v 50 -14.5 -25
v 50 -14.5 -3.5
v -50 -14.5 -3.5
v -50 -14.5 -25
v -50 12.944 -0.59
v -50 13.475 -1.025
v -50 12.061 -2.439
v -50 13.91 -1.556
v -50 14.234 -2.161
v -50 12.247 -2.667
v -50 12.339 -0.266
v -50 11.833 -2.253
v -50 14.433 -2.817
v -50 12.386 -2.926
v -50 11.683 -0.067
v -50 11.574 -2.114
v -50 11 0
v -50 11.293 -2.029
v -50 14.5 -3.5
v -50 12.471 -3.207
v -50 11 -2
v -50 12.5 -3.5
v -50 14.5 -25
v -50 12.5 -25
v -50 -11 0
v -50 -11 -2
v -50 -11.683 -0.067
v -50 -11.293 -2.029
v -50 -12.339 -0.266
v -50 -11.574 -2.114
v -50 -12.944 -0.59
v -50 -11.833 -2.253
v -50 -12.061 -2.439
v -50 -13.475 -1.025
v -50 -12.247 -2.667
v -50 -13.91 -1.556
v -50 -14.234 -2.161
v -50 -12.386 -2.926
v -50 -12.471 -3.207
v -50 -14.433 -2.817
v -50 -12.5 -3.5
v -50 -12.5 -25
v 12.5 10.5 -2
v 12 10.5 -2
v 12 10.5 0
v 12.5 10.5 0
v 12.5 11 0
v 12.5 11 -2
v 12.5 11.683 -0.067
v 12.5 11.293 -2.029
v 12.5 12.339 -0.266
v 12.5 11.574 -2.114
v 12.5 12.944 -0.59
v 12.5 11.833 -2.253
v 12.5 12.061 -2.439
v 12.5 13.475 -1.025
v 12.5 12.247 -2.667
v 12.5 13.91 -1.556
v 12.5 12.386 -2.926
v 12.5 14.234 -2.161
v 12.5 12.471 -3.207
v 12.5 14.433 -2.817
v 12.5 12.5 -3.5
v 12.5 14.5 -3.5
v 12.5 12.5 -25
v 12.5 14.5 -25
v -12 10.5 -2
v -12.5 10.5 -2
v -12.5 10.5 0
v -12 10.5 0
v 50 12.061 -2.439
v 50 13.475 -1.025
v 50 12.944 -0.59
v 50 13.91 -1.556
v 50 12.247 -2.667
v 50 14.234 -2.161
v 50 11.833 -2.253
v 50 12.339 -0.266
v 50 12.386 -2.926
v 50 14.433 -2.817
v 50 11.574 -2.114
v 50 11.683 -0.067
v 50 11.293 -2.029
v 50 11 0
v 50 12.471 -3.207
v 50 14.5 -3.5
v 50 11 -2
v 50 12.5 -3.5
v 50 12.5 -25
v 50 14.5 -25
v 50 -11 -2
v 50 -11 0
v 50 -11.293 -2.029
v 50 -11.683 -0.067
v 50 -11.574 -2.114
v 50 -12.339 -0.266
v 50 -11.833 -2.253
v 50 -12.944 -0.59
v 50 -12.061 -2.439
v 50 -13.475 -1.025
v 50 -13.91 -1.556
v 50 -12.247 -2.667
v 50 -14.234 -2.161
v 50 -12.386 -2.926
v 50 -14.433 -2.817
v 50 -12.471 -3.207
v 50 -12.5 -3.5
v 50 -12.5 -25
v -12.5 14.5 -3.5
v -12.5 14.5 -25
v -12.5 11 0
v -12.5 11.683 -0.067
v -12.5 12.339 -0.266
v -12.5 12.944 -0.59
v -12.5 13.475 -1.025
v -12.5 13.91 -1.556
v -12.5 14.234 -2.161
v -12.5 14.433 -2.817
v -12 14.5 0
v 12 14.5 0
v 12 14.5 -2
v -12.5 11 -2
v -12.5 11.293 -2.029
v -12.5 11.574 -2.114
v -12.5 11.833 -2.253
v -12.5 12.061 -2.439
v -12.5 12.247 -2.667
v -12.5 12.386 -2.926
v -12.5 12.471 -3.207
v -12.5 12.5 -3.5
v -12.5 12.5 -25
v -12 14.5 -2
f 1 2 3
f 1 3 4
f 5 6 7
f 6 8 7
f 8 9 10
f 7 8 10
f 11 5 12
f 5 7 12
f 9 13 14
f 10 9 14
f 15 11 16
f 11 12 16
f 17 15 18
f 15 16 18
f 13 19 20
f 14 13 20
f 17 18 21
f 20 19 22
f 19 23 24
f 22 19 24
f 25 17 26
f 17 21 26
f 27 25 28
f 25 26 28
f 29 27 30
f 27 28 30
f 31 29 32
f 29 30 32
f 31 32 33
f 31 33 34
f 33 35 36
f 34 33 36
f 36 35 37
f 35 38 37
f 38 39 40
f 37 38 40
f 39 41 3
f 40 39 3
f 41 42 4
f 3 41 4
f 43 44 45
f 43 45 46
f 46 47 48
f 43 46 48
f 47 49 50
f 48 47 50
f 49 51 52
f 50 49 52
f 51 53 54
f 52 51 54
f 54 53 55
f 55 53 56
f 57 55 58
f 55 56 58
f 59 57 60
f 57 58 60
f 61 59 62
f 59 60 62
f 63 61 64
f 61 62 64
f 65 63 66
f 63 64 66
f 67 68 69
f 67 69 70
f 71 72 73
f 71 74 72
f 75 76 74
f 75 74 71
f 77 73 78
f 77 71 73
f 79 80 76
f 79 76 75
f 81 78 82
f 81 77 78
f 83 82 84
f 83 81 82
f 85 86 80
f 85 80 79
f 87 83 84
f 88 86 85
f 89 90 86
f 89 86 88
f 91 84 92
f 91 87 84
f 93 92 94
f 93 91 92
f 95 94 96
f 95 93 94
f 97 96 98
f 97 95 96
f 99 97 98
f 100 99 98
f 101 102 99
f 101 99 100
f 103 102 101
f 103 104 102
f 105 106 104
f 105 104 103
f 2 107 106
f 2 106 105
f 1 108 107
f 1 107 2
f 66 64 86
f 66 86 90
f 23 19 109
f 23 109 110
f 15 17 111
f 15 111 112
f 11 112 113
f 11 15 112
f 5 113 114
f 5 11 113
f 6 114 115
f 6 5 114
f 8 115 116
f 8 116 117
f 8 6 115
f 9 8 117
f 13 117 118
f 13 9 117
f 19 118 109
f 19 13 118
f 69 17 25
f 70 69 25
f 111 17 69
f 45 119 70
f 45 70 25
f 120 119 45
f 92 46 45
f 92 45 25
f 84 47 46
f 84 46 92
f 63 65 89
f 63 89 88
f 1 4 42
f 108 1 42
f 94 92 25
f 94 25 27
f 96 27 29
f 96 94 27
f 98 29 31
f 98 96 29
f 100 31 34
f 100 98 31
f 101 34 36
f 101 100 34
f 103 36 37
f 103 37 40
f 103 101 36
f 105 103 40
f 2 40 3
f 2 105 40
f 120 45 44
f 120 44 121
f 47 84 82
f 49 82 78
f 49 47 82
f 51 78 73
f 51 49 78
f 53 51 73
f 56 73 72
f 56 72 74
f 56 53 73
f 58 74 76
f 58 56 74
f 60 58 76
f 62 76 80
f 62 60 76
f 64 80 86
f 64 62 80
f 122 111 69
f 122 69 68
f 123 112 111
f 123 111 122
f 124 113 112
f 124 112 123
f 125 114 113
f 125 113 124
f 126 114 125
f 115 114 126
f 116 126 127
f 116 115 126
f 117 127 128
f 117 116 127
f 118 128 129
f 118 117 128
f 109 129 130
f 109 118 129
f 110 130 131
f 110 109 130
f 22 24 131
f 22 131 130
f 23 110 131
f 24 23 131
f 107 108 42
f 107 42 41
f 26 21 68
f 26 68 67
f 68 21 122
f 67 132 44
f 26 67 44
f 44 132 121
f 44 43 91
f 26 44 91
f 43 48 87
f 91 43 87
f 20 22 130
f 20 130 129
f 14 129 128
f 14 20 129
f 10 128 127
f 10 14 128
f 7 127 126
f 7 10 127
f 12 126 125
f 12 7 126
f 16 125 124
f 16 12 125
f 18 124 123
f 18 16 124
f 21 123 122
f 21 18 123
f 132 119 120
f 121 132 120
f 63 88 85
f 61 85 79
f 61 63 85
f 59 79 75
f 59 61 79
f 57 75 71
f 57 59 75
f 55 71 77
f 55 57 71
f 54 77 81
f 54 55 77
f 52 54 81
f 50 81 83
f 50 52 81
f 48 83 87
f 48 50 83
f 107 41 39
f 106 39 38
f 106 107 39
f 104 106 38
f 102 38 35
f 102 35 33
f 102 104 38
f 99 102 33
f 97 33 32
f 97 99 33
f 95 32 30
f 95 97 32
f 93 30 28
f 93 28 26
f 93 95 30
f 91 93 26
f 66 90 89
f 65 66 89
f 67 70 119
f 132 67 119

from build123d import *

# Parameters (mm, degrees)
SKETCH_1_W                         = 100
SKETCH_1_H                         = 25
SM_BASE_FLANGE_1_DEPTH             = 2
SM_EDGE_FLANGE_1_STRIP_W           = 11
SM_EDGE_FLANGE_1_STRIP_H           = 2
SM_EDGE_FLANGE_1_STRIP_CUT_DEPTH   = 100
SM_EDGE_FLANGE_1_STRIP_2_W         = 11
SM_EDGE_FLANGE_1_STRIP_2_H         = 2
SM_EDGE_FLANGE_1_STRIP_CUT_2_DEPTH = 100
SM_EDGE_FLANGE_1_DEPTH             = 100
SM_EDGE_FLANGE_1_BEND_DEPTH        = 100
SKETCH_12_W                        = 25
SKETCH_12_H                        = 25
CUT_EXTRUDE_1_DEPTH                = 4
SKETCH_24_W                        = 24
SKETCH_24_H                        = 4
EXTRUDE_1_DEPTH                    = 2


# Sheet-metal steps are written as plain solids
with BuildPart() as part:
    # Sketch 1 → Базовая кромка1 (new body)
    with BuildSketch(Plane.XY):
        Rectangle(SKETCH_1_W, SKETCH_1_H)
    extrude(amount=-SM_BASE_FLANGE_1_DEPTH)

    # Ребро-кромка1 strip (across the edge) → Ребро-кромка1 strip cut (cut)
    with BuildSketch(Plane(origin=(-50, 12.5, -2), x_dir=(0, -1, 0), z_dir=(1, 0, 0))):
        with Locations((-4, -1)):
            Rectangle(SM_EDGE_FLANGE_1_STRIP_W, SM_EDGE_FLANGE_1_STRIP_H)
    extrude(amount=SM_EDGE_FLANGE_1_STRIP_CUT_DEPTH, mode=Mode.SUBTRACT)

    # Ребро-кромка1 strip 2 (across the edge) → Ребро-кромка1 strip cut 2 (cut)
    with BuildSketch(Plane(origin=(50, -12.5, -2), x_dir=(0, 1, 0), z_dir=(-1, 0, 0))):
        with Locations((-4, -1)):
            Rectangle(SM_EDGE_FLANGE_1_STRIP_2_W, SM_EDGE_FLANGE_1_STRIP_2_H)
    extrude(amount=SM_EDGE_FLANGE_1_STRIP_CUT_2_DEPTH, mode=Mode.SUBTRACT)

    # Ребро-кромка1 section (across the edge) → Ребро-кромка1 (add)
    with BuildSketch(Plane(origin=(-50, 12.5, -2), x_dir=(0, -1, 0), z_dir=(1, 0, 0))):
        with BuildLine():
            Line((-2, 1.5), (-2, 23))
            Line((-2, 23), (0, 23))
            Line((0, 23), (0, 1.5))
            ThreePointArc((0, 1.5), (0.439339828, 0.439339828), (1.5, 0))
            Line((1.5, 0), (1.5, -2))
            ThreePointArc((1.5, -2), (-0.974873734, -0.974873734), (-2, 1.5))
        make_face()
    extrude(amount=SM_EDGE_FLANGE_1_DEPTH)

    # Ребро-кромка1 section 2 (across the edge) → Ребро-кромка1 bend (add)
    with BuildSketch(Plane(origin=(50, -12.5, -2), x_dir=(0, 1, 0), z_dir=(-1, 0, 0))):
        with BuildLine():
            Line((-2, 1.5), (-2, 23))
            Line((-2, 23), (0, 23))
            Line((0, 23), (0, 1.5))
            ThreePointArc((0, 1.5), (0.439339828, 0.439339828), (1.5, 0))
            Line((1.5, 0), (1.5, -2))
            ThreePointArc((1.5, -2), (-0.974873734, -0.974873734), (-2, 1.5))
        make_face()
    extrude(amount=SM_EDGE_FLANGE_1_BEND_DEPTH)

    # Эскиз12 → Вырез-Вытянуть1 (cut)
    with BuildSketch(Plane(origin=(0, 14.5, 0), x_dir=(1, 0, 0), z_dir=(0, 1, 0))):
        with Locations((0, 12.5)):
            Rectangle(SKETCH_12_W, SKETCH_12_H)
    extrude(amount=-CUT_EXTRUDE_1_DEPTH, mode=Mode.SUBTRACT)

    # Эскиз24 → Бобышка-Вытянуть1 (add)
    with BuildSketch(Plane.XY):
        with Locations((0, 12.5)):
            Rectangle(SKETCH_24_W, SKETCH_24_H)
    extrude(amount=-EXTRUDE_1_DEPTH)


solid = part.part
